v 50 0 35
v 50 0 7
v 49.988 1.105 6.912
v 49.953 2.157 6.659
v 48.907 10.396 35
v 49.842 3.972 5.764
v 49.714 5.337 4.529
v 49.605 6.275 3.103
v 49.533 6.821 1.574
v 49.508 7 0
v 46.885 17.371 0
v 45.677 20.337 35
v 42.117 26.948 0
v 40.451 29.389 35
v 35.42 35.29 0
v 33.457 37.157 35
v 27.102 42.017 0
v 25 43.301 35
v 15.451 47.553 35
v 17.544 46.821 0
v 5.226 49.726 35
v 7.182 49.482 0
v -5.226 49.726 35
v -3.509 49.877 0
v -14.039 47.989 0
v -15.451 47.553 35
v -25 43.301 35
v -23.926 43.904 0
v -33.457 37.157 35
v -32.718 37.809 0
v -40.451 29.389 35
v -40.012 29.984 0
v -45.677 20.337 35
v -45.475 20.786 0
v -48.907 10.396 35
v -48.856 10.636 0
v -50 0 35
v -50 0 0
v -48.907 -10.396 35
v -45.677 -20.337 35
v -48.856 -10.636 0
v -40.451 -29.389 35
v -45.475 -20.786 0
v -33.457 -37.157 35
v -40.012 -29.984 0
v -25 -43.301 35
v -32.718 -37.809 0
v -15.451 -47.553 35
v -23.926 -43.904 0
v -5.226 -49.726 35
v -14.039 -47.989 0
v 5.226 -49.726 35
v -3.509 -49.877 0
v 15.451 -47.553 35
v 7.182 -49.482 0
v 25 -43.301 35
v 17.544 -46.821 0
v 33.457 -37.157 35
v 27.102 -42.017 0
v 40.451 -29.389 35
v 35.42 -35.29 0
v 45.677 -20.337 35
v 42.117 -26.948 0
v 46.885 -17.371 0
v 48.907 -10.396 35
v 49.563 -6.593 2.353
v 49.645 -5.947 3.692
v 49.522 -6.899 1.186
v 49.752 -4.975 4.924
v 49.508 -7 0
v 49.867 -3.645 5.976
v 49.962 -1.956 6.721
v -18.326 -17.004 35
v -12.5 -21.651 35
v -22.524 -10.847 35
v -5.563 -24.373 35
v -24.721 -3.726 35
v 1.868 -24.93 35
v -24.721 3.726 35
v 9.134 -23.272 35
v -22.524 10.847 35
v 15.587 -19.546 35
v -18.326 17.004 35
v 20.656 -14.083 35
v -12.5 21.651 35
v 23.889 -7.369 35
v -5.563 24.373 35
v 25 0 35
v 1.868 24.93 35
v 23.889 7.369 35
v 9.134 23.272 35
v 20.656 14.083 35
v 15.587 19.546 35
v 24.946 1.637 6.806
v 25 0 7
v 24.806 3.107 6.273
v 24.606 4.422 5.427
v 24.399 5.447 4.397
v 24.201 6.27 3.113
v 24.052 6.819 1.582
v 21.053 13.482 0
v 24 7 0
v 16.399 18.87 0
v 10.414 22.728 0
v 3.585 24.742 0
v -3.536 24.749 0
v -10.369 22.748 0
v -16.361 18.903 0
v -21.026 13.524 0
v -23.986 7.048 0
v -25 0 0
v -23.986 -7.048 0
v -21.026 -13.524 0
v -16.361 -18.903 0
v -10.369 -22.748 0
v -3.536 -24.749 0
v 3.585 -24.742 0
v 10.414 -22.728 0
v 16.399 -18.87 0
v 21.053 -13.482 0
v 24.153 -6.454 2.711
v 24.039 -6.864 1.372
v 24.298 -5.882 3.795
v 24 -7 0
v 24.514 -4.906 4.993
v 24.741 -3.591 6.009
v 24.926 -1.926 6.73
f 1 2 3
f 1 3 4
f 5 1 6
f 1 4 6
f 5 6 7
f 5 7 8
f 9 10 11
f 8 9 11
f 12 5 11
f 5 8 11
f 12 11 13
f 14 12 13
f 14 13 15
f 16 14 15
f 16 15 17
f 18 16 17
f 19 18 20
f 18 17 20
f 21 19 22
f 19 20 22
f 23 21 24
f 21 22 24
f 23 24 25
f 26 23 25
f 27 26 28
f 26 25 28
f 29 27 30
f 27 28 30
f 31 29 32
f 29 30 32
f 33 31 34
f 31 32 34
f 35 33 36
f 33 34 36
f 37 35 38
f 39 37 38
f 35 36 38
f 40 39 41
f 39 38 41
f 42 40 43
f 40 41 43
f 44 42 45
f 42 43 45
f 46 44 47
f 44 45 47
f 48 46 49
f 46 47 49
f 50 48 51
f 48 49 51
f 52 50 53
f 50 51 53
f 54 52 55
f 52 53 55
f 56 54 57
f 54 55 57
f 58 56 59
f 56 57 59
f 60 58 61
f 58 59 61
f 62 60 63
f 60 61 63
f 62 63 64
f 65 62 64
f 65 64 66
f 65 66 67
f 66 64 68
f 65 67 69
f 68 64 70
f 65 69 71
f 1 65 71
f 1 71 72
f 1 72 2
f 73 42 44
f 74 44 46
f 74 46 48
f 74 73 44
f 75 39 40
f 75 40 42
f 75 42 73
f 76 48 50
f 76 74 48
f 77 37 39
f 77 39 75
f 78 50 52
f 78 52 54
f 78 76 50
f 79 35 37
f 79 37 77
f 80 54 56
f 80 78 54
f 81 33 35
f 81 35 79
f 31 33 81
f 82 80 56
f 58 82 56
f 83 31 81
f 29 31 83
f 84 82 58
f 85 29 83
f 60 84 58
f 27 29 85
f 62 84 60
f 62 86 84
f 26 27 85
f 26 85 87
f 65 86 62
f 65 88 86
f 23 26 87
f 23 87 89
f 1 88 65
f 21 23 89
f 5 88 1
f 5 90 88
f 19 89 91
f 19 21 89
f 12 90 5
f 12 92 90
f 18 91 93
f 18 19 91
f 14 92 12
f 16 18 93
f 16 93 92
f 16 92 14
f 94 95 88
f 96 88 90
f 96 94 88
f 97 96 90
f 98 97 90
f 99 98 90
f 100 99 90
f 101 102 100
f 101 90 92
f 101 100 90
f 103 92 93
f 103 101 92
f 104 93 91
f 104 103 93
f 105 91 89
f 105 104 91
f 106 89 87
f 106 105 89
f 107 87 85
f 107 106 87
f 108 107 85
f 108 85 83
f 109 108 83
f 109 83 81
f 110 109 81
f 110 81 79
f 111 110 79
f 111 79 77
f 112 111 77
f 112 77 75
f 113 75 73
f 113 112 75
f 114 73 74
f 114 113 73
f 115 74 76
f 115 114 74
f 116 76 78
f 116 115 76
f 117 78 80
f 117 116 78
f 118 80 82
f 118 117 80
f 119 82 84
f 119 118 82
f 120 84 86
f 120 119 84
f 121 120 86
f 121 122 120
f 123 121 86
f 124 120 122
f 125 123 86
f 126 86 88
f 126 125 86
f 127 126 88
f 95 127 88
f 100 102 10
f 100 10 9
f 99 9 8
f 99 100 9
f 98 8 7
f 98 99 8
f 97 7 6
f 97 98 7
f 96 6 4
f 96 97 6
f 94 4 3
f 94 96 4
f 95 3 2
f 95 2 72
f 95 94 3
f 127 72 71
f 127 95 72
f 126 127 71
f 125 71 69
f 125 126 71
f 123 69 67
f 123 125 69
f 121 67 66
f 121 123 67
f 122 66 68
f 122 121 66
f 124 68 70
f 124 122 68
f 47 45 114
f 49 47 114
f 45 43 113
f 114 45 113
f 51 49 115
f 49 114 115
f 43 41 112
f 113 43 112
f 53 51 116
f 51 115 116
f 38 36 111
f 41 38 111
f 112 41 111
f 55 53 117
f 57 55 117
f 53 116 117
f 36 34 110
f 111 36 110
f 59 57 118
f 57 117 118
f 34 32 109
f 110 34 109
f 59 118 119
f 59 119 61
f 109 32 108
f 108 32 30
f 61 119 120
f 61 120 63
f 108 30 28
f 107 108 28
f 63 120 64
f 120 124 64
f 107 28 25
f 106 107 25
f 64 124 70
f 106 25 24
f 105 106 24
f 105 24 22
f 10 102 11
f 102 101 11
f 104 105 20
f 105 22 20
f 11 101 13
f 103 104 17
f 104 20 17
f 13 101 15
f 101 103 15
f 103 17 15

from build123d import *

# Parameters (mm, degrees)
F0_R     = 50
F1_DEPTH = 35
F2_R     = 25
F3_DEPTH = 35
F4_R     = 7
F5_DEPTH = 50.001


with BuildPart() as f1:
    # F0 (on Top) → F1 (new body)
    with BuildSketch(Plane.XY):
        Circle(F0_R)
    extrude(amount=F1_DEPTH)

    # F2 (on Top) → F3 (cut)
    with BuildSketch(Plane.XY):
        Circle(F2_R)
    extrude(amount=F3_DEPTH, mode=Mode.SUBTRACT)

    # F4 (on Right) → F5 (cut, through all)
    with BuildSketch(Plane.YZ):
        Circle(F4_R)
    extrude(amount=F5_DEPTH, mode=Mode.SUBTRACT)


solid = f1.part
